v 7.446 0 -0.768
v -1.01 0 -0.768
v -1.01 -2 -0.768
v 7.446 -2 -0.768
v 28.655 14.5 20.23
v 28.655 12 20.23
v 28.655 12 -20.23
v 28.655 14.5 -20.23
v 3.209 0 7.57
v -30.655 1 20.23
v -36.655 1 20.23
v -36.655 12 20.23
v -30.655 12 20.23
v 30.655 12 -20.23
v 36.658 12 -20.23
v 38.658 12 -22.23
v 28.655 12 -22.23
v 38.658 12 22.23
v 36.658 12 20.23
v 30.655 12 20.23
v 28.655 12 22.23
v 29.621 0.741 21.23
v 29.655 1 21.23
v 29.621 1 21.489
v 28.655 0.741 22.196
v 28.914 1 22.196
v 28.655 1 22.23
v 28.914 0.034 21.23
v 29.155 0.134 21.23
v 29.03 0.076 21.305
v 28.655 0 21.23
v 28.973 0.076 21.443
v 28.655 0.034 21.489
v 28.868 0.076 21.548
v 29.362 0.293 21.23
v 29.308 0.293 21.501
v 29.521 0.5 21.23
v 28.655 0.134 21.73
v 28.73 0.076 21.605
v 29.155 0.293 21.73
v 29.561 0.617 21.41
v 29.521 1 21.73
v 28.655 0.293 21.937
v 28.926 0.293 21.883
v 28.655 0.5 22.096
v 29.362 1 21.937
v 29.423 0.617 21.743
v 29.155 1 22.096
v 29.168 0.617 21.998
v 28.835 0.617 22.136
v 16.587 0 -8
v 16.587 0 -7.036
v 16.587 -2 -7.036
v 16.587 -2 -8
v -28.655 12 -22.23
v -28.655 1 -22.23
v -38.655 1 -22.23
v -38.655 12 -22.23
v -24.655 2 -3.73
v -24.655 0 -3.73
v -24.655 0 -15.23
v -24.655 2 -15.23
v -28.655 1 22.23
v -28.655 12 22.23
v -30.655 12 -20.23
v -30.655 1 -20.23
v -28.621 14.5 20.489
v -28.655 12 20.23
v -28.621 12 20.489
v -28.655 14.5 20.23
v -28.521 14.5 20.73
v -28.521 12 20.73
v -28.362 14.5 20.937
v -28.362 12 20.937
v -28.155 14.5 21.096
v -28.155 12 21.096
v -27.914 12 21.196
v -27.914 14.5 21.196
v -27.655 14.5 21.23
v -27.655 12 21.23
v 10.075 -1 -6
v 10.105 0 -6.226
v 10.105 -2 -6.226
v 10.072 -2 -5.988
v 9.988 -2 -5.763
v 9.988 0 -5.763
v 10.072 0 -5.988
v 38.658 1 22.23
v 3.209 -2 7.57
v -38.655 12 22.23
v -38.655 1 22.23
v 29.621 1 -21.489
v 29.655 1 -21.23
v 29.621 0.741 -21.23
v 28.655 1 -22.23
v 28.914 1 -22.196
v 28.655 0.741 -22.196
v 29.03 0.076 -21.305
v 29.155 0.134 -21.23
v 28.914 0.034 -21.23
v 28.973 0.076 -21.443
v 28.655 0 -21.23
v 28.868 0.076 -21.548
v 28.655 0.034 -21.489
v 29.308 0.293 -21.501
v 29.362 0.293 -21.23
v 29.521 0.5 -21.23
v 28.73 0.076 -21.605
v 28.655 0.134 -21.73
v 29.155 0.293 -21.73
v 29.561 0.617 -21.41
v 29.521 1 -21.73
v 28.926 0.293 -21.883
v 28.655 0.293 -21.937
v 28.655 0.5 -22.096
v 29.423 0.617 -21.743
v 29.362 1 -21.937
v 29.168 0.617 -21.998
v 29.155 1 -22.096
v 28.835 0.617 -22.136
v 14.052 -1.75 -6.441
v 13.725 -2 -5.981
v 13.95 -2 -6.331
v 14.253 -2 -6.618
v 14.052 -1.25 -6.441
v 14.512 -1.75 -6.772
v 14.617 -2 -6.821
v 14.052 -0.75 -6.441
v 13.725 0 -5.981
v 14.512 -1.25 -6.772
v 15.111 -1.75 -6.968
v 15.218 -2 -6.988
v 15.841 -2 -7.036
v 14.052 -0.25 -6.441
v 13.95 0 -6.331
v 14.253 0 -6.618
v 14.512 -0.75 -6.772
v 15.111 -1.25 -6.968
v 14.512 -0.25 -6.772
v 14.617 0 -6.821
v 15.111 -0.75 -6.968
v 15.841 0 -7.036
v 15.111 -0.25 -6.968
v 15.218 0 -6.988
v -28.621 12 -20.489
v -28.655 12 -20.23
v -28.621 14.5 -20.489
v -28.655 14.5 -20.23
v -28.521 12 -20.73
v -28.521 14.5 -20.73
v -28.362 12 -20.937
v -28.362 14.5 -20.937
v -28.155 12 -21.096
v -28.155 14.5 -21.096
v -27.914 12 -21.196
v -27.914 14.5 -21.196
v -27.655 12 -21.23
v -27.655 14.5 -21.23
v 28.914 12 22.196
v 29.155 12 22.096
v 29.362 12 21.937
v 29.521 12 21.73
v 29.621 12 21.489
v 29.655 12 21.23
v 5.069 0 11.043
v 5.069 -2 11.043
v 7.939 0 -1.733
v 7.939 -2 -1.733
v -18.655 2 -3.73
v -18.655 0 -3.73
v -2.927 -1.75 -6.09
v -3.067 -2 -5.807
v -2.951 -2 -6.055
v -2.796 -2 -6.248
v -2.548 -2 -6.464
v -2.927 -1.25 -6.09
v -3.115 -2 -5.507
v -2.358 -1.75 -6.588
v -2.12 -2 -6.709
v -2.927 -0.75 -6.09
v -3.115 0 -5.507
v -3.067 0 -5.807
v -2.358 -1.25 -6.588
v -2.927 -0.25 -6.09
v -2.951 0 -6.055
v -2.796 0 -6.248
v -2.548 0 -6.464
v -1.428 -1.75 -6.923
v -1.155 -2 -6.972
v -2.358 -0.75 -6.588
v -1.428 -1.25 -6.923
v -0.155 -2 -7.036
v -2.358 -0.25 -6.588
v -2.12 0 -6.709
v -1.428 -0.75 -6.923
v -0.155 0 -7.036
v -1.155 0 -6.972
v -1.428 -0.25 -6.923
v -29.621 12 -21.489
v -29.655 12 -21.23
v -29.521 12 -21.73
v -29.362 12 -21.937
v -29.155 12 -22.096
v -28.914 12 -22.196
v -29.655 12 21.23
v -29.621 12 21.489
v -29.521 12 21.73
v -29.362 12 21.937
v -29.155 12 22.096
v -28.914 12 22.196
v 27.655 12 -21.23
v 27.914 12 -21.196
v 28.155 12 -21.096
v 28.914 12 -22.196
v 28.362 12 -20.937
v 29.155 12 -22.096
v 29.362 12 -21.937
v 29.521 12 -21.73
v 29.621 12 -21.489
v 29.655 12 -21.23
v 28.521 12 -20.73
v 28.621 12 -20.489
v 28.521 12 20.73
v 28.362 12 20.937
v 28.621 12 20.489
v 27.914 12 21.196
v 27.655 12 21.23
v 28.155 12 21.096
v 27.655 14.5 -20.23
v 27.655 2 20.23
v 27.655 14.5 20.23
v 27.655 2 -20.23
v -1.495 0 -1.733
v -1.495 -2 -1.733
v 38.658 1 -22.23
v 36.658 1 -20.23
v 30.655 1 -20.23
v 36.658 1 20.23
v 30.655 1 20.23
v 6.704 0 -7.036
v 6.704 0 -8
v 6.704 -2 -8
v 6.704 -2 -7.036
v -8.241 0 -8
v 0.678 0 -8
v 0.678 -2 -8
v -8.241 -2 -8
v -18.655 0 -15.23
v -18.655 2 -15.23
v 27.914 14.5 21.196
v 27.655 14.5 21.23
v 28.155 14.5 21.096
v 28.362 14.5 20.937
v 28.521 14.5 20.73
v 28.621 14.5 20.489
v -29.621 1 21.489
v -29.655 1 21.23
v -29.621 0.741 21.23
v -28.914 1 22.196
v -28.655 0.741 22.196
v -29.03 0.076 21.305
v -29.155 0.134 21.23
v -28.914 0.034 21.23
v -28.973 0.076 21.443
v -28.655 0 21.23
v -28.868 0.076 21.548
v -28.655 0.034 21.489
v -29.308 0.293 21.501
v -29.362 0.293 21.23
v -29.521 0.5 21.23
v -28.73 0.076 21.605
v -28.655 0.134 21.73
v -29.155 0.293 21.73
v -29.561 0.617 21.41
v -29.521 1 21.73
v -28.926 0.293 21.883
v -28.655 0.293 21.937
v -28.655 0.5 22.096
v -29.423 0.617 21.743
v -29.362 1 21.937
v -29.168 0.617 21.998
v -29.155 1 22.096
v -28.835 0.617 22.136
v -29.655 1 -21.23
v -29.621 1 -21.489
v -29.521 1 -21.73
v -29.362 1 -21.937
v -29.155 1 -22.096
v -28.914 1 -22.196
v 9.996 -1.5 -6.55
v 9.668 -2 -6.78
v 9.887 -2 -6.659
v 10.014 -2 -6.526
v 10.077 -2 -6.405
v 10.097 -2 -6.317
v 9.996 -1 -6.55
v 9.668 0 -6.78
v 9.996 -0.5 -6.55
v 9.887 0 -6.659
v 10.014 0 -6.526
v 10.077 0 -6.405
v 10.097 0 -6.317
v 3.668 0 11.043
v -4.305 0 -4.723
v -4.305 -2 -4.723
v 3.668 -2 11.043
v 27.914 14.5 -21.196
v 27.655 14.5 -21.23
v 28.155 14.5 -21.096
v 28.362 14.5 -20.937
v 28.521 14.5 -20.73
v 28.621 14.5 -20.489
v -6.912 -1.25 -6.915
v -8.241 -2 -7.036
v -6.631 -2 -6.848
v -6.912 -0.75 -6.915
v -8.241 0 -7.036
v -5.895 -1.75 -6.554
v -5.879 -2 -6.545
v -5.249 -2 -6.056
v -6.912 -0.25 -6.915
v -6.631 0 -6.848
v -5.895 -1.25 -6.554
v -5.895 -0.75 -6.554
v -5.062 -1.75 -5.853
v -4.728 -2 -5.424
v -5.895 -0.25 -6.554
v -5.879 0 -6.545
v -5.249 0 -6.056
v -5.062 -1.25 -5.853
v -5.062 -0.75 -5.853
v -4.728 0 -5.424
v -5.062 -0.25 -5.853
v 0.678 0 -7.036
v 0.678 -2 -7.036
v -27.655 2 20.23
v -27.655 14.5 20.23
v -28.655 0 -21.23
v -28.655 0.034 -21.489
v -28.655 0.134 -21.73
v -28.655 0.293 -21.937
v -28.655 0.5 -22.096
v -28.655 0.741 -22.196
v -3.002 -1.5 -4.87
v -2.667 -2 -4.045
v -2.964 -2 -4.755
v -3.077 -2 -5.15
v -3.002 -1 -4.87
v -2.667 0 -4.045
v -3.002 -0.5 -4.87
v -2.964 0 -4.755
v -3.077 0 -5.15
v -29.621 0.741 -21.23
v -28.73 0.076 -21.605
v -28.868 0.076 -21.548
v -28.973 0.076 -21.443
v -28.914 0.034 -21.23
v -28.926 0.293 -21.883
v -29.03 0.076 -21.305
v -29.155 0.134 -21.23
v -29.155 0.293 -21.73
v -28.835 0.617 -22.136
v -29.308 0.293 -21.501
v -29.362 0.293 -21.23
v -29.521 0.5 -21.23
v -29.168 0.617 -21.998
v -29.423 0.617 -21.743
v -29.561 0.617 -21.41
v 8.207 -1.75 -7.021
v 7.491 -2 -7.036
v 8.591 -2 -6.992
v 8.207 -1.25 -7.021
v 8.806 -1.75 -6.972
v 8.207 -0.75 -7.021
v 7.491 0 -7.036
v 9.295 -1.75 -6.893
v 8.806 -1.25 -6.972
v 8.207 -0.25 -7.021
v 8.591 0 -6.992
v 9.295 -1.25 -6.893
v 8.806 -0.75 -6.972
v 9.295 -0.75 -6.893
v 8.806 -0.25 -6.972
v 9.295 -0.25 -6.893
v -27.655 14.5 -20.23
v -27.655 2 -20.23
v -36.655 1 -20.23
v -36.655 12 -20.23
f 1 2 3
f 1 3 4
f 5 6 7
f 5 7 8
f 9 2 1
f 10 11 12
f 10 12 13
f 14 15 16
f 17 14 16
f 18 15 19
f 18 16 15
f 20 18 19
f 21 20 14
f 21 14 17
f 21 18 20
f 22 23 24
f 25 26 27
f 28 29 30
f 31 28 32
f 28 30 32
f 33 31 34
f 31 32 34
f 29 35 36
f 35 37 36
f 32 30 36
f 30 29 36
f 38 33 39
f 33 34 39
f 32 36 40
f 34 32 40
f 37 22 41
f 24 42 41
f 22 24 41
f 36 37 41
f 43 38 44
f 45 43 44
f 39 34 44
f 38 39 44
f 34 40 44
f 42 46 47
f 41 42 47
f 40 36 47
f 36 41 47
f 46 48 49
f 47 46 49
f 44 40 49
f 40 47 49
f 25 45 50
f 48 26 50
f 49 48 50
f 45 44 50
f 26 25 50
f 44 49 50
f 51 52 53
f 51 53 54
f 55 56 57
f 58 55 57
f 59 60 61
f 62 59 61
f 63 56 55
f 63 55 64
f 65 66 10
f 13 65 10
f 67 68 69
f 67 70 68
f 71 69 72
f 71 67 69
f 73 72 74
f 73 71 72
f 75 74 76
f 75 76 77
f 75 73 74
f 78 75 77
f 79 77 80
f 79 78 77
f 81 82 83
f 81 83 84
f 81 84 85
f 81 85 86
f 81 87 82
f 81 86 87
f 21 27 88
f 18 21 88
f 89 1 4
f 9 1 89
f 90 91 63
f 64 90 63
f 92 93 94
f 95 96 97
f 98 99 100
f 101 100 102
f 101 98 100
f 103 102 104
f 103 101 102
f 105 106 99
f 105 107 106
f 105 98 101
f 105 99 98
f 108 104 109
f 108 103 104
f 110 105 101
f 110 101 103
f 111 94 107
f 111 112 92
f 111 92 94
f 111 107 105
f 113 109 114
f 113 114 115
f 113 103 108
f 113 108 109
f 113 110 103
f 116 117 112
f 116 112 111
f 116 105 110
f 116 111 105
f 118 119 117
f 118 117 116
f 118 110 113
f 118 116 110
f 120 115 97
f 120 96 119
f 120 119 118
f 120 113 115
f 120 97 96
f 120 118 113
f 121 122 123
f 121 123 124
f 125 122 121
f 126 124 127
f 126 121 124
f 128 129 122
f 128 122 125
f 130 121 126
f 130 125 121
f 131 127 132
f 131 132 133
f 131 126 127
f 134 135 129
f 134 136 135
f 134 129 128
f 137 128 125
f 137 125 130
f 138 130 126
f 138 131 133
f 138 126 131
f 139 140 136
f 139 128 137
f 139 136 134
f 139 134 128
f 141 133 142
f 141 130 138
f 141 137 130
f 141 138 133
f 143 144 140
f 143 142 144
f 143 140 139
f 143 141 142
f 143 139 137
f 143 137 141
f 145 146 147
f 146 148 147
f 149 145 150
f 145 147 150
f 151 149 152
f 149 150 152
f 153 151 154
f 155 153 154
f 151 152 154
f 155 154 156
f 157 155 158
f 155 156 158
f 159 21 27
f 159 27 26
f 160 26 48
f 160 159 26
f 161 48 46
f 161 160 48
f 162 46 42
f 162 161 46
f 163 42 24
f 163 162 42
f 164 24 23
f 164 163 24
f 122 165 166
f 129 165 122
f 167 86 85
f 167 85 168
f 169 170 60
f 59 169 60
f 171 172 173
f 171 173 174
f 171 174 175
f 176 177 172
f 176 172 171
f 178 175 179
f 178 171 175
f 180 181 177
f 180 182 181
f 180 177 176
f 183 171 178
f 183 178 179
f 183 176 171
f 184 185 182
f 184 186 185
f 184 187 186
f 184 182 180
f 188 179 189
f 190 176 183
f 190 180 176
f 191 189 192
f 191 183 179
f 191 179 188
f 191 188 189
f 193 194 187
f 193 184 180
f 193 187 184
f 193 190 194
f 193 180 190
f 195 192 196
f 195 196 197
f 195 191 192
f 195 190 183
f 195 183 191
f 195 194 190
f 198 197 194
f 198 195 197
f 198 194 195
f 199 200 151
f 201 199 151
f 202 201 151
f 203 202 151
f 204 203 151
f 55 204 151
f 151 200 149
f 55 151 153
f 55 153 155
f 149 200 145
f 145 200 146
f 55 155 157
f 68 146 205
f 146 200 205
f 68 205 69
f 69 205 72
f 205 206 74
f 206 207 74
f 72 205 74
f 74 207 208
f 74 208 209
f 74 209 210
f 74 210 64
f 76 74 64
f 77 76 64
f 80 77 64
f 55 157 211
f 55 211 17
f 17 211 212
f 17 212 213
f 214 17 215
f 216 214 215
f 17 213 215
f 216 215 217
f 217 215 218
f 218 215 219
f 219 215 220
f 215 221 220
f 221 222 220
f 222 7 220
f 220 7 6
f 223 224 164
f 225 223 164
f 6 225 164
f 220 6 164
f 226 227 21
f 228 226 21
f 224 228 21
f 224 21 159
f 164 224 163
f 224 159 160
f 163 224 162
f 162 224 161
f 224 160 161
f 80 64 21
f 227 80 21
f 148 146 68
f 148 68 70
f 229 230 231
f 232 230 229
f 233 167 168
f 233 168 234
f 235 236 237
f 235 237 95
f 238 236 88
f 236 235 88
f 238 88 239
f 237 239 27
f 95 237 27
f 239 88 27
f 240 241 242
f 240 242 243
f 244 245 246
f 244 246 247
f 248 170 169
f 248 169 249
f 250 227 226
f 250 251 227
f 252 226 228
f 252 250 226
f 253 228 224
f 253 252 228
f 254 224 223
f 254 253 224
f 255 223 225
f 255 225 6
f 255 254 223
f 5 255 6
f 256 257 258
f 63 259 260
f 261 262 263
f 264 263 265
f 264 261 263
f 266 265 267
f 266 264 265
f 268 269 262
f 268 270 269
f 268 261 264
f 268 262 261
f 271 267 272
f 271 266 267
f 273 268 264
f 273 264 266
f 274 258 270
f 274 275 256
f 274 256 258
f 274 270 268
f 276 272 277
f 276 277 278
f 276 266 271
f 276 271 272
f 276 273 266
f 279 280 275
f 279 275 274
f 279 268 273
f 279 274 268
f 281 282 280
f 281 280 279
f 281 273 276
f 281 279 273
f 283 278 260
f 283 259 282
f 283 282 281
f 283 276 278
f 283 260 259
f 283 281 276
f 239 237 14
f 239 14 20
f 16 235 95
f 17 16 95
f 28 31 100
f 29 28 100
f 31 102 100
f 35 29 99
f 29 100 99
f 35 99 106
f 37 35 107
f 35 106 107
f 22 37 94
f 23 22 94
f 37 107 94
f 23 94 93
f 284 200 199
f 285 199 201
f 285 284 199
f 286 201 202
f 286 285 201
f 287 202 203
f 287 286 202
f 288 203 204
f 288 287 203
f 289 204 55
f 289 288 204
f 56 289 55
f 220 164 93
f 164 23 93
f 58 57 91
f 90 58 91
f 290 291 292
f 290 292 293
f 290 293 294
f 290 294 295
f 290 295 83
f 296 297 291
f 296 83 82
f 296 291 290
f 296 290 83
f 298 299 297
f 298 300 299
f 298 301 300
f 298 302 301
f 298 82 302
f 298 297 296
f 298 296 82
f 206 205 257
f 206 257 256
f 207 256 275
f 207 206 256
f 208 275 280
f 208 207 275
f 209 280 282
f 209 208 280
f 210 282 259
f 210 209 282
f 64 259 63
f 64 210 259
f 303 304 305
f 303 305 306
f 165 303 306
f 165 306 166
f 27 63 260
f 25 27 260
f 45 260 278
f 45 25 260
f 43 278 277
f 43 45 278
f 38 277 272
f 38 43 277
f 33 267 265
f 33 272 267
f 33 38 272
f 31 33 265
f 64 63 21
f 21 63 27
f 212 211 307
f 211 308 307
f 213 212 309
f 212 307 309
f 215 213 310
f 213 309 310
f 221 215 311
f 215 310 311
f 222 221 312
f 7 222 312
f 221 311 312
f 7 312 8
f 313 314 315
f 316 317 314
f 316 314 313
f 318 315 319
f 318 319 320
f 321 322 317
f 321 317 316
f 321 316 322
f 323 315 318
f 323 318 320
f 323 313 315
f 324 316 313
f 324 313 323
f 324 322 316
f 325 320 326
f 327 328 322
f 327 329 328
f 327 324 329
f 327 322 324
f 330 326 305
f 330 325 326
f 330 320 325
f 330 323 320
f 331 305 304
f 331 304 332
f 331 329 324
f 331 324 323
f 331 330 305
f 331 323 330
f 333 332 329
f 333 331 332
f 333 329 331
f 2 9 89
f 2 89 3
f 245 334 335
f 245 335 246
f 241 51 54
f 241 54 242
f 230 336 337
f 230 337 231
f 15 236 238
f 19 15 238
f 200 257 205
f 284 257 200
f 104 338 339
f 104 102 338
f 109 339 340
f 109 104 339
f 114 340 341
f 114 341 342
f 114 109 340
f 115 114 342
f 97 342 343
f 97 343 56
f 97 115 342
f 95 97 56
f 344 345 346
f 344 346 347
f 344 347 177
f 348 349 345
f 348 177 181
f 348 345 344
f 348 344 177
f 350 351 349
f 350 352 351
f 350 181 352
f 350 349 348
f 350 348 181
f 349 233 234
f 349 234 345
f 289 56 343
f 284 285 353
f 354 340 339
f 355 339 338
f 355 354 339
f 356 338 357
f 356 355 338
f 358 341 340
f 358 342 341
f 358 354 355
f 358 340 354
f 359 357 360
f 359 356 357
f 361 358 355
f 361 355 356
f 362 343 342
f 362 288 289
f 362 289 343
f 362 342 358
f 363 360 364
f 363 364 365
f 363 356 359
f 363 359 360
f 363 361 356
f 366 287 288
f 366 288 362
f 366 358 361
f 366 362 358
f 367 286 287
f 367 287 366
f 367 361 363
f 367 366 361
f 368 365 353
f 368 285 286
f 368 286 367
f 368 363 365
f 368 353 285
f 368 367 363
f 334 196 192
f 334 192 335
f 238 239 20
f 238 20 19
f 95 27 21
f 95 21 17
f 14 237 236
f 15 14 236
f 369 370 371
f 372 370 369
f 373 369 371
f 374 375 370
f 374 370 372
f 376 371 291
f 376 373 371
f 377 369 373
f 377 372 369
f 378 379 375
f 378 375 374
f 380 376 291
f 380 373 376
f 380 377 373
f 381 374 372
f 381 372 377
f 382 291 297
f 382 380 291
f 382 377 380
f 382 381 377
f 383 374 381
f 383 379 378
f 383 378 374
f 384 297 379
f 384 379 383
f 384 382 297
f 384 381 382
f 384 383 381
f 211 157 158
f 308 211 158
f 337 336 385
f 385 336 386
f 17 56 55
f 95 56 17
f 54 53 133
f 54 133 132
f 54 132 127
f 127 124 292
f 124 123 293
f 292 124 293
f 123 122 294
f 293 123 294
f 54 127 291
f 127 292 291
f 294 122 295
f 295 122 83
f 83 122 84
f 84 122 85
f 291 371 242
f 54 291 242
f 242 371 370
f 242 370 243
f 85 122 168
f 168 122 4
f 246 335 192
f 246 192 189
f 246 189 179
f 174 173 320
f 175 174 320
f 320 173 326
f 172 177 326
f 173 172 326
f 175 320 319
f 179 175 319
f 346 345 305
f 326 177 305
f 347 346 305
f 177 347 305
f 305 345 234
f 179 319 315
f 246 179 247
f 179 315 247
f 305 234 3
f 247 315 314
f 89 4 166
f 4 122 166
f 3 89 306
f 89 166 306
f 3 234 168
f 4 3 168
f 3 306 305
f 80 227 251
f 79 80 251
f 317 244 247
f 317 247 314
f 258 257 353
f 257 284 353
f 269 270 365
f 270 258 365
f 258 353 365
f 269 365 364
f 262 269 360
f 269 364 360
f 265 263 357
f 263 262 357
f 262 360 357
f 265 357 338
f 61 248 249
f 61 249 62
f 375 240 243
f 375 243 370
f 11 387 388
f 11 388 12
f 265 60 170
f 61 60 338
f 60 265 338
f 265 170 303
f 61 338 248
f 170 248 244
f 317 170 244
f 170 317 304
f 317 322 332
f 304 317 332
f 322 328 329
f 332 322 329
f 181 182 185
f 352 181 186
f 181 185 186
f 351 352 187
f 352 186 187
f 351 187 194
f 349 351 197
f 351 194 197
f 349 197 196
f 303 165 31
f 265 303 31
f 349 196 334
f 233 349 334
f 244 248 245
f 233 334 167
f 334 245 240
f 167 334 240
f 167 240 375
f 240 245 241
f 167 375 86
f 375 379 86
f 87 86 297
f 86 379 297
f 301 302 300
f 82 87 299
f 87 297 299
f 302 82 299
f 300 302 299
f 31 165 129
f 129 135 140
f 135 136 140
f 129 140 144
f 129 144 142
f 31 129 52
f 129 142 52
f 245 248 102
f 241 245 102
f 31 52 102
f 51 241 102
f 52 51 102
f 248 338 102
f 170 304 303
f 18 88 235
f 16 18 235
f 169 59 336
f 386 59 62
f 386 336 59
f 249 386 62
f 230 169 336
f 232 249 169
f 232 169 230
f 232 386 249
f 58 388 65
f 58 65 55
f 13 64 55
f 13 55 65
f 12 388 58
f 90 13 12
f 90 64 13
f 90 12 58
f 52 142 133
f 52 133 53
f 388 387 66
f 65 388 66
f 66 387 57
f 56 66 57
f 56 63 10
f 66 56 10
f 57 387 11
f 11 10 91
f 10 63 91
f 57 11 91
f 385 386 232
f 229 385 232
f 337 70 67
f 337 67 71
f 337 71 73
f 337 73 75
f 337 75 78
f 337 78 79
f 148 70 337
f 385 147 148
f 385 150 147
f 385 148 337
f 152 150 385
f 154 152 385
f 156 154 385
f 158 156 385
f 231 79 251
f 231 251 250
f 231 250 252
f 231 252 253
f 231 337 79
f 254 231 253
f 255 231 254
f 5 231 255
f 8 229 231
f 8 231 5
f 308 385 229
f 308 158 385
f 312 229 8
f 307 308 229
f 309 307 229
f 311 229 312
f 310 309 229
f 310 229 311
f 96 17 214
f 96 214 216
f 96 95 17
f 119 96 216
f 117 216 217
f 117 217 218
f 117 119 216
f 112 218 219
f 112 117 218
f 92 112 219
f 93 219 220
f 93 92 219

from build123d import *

# Parameters (mm, degrees)
SKETCH1_W              = 59.31
SKETCH1_H              = 44.46
BOSS_EXTRUDE1_DEPTH    = 2
SKETCH2_W              = 59.31
SKETCH2_H              = 44.46
SKETCH2_W_2            = 55.31
SKETCH2_H_2            = 40.46
BOSS_EXTRUDE2_DEPTH    = 12.5
SKETCH3_W              = 1
SKETCH3_H              = 2.5
FILLET1_R              = 1
SKETCH5_W              = 6
SKETCH5_H              = 11.5
CUT_EXTRUDE1_DEPTH     = 10
BOSS_EXTRUDE3_DEPTH    = 2
BOSS_EXTRUDE10_START   = -1
SKETCH7_W              = 6
SKETCH7_H              = 40.46
BOSS_EXTRUDE10_DEPTH   = 11
SKETCH7_W_2            = 6.003374691
BOSS_EXTRUDE10_2_DEPTH = 11


with BuildPart() as part:
    # Sketch1 → Boss-Extrude1 (new body)
    with BuildSketch(Plane(origin=(0, 0, 0), x_dir=(1, 0, 0), z_dir=(0, 1, 0))):
        Rectangle(SKETCH1_W, SKETCH1_H)
    extrude(amount=BOSS_EXTRUDE1_DEPTH)

    # Sketch2 → Boss-Extrude2 (add)
    with BuildSketch(Plane(origin=(0, 2, 0), x_dir=(1, 0, 0), z_dir=(0, 1, 0))):
        Rectangle(SKETCH2_W, SKETCH2_H)
        Rectangle(SKETCH2_W_2, SKETCH2_H_2, mode=Mode.SUBTRACT)
    extrude(amount=BOSS_EXTRUDE2_DEPTH)

    # Cut-Sweep1: sweep along a path in Sketch4
    with BuildLine(Plane(origin=(0, 14.5, 0), x_dir=(1, 0, 0), z_dir=(0, 1, 0))) as cut_sweep1_path:
        Line((-29.655, -22.23), (29.655, -22.23))
        Line((29.655, -22.23), (29.655, 22.23))
        Line((29.655, 22.23), (-29.655, 22.23))
        Line((-29.655, 22.23), (-29.655, -22.23))
    # Sketch3 → Cut-Sweep1 (sweep, cut)
    with BuildSketch(Plane(origin=(29.655, 0, 0), x_dir=(0, 0, -1), z_dir=(1, 0, 0))):
        with Locations((-21.73, 13.25)):
            Rectangle(SKETCH3_W, SKETCH3_H)
    sweep(path=cut_sweep1_path.line, transition=Transition.RIGHT, mode=Mode.SUBTRACT)

    # Fillet1
    fillet1_edges = [part.edges().sort_by_distance(p)[0] for p in [
        (29.655, 6, 22.23),
        (-29.655, 6, 22.23),
        (-29.655, 6, -22.23),
        (29.655, 6, -22.23),
        (-28.655, 13.25, -21.23),
        (28.655, 13.25, -21.23),
        (28.655, 13.25, 21.23),
        (-28.655, 13.25, 21.23),
        (29.655, 0, 0),
        (0, 0, -22.23),
        (-29.655, 0, 0),
        (0, 0, 22.23),
    ]]
    fillet(fillet1_edges, radius=FILLET1_R)

    # Sketch5 → Cut-Extrude1 (cut)
    with BuildSketch(Plane(origin=(0, 0, 0), x_dir=(-1, 0, 0), z_dir=(0, -1, 0))):
        with Locations((21.655, 9.48)):
            Rectangle(SKETCH5_W, SKETCH5_H)
    extrude(amount=-CUT_EXTRUDE1_DEPTH, mode=Mode.SUBTRACT)

    # Sketch6 → Boss-Extrude3 (add)
    with BuildSketch(Plane.XZ):
        with BuildLine():
            Line((3.668359532, 11.043003806), (5.069466615, 11.043003806))
            Line((5.069466615, 11.043003806), (13.724692633, -5.981200546))
            add(Edge.make_bspline(
                [(13.724692633, -5.981200546), (13.770465415, -6.066255609), (13.860276332, -6.233142412), (14.049596398, -6.44471403), (14.259282132, -6.635498751), (14.514562764, -6.779774023), (14.797989941, -6.899882103), (15.118123905, -6.972877212), (15.467702486, -7.031048399), (15.713066528, -7.034166281), (15.841418927, -7.035797276)],
                knots=[0, 0, 0, 0, 0.923122777, 1.811262043, 2.707284477, 3.630407254, 4.607627564, 5.650245945, 6.770820012, 8, 8, 8, 8], degree=3))
            Line((15.841418927, -7.035797276), (16.587169471, -7.035797276))
            Line((16.587169471, -7.035797276), (16.587169471, -8))
            Line((16.587169471, -8), (6.704091546, -8))
            Line((6.704091546, -8), (6.704091546, -7.035797276))
            Line((6.704091546, -7.035797276), (7.491272677, -7.035797276))
            add(Edge.make_bspline(
                [(7.491272677, -7.035797276), (7.615561715, -7.034972065), (7.854152468, -7.033387954), (8.197254943, -7.024270941), (8.510837169, -6.998643255), (8.797935797, -6.976226749), (9.056099226, -6.935998597), (9.287242582, -6.897915489), (9.488634661, -6.845109649), (9.610791127, -6.800614432), (9.66826164, -6.779680927)],
                knots=[0, 0, 0, 0, 1.354335262, 2.59984206, 3.738199698, 4.78223889, 5.735982514, 6.583888141, 7.33376694, 8, 8, 8, 8], degree=3))
            add(Edge.make_bspline(
                [(9.66826164, -6.779680927), (9.734616654, -6.749406693), (9.857910933, -6.693154125), (9.99935023, -6.559441952), (10.092017823, -6.401790611), (10.10075551, -6.2849798), (10.105166, -6.226017644)],
                knots=[0, 0, 0, 0, 1.157571245, 2.15088362, 3.06662844, 4, 4, 4, 4], degree=3))
            add(Edge.make_bspline(
                [(10.105166, -6.226017644), (10.098921578, -6.149754311), (10.08575846, -5.988992716), (10.021947105, -5.840695302), (9.988407076, -5.762748366)],
                knots=[0, 0, 0, 0, 0.948775522, 2, 2, 2, 2], degree=3))
            Line((9.988407076, -5.762748366), (7.939476287, -1.732682292))
            Line((7.939476287, -1.732682292), (-1.495398027, -1.732682292))
            Line((-1.495398027, -1.732682292), (-2.666753681, -4.045262263))
            add(Edge.make_bspline(
                [(-2.666753681, -4.045262263), (-2.73463111, -4.18986222), (-2.860946743, -4.458953658), (-2.99975414, -4.849828516), (-3.097335174, -5.191789881), (-3.109447861, -5.40819885), (-3.114957291, -5.506632017)],
                knots=[0, 0, 0, 0, 1.244034282, 2.315069679, 3.233612959, 4, 4, 4, 4], degree=3))
            add(Edge.make_bspline(
                [(-3.114957291, -5.506632017), (-3.105178856, -5.610008506), (-3.085538794, -5.817640973), (-2.930679332, -6.11109022), (-2.683549261, -6.372065908), (-2.348052402, -6.608977598), (-1.921244388, -6.804306269), (-1.406472367, -6.937233956), (-0.80918362, -7.025851211), (-0.382171294, -7.032338986), (-0.154553614, -7.035797276)],
                knots=[0, 0, 0, 0, 0.676796425, 1.359350793, 2.130179084, 3.02304161, 4.041766613, 5.196580708, 6.505645488, 8, 8, 8, 8], degree=3))
            Line((-0.154553614, -7.035797276), (0.677824519, -7.035797276))
            Line((0.677824519, -7.035797276), (0.677824519, -8))
            Line((0.677824519, -8), (-8.241050681, -8))
            Line((-8.241050681, -8), (-8.241050681, -7.035797276))
            add(Edge.make_bspline(
                [(-8.241050681, -7.035797276), (-8.00595871, -7.030682959), (-7.560198321, -7.020985648), (-6.930404722, -6.931476506), (-6.376944833, -6.783238723), (-5.886269273, -6.568068877), (-5.442332689, -6.26093688), (-5.039212162, -5.844454164), (-4.645254972, -5.330344026), (-4.423041234, -4.933672593), (-4.305145029, -4.723217304)],
                knots=[0, 0, 0, 0, 1.157126977, 2.194040787, 3.123941644, 3.970721164, 4.81957436, 5.763811563, 6.813583119, 8, 8, 8, 8], degree=3))
            Line((-4.305145029, -4.723217304), (3.668359532, 11.043003806))
        make_face()
        Polygon((3.208856671, 7.570367432), (-1.009530248, -0.768479567), (7.446075674, -0.768479567), align=None, mode=Mode.SUBTRACT)
    extrude(amount=BOSS_EXTRUDE3_DEPTH)


with BuildPart() as body_2:
    # Sketch7 → Boss-Extrude10 (new body)
    with BuildSketch(Plane.XZ.offset(BOSS_EXTRUDE10_START)):
        Polygon((-28.655, 20.23), (-28.655, -20.23), (-28.655, -22.23), (-38.655, -22.23), (-38.655, 22.23), (-28.655, 22.23), align=None)
        with Locations((-33.655, 0)):
            Rectangle(SKETCH7_W, SKETCH7_H, mode=Mode.SUBTRACT)
    extrude(amount=-BOSS_EXTRUDE10_DEPTH)


with BuildPart() as body_3:
    # Sketch7 → Boss-Extrude10 2 (new body)
    with BuildSketch(Plane.XZ.offset(BOSS_EXTRUDE10_START)):
        Polygon((28.655, -20.23), (28.655, 20.23), (28.655, 22.23), (38.658374691, 22.23), (38.658374691, -22.23), (28.655, -22.23), align=None)
        with Locations((33.656687346, 0)):
            Rectangle(SKETCH7_W_2, SKETCH7_H, mode=Mode.SUBTRACT)
    extrude(amount=-BOSS_EXTRUDE10_2_DEPTH)


solid = Compound([part.part, body_2.part, body_3.part])
